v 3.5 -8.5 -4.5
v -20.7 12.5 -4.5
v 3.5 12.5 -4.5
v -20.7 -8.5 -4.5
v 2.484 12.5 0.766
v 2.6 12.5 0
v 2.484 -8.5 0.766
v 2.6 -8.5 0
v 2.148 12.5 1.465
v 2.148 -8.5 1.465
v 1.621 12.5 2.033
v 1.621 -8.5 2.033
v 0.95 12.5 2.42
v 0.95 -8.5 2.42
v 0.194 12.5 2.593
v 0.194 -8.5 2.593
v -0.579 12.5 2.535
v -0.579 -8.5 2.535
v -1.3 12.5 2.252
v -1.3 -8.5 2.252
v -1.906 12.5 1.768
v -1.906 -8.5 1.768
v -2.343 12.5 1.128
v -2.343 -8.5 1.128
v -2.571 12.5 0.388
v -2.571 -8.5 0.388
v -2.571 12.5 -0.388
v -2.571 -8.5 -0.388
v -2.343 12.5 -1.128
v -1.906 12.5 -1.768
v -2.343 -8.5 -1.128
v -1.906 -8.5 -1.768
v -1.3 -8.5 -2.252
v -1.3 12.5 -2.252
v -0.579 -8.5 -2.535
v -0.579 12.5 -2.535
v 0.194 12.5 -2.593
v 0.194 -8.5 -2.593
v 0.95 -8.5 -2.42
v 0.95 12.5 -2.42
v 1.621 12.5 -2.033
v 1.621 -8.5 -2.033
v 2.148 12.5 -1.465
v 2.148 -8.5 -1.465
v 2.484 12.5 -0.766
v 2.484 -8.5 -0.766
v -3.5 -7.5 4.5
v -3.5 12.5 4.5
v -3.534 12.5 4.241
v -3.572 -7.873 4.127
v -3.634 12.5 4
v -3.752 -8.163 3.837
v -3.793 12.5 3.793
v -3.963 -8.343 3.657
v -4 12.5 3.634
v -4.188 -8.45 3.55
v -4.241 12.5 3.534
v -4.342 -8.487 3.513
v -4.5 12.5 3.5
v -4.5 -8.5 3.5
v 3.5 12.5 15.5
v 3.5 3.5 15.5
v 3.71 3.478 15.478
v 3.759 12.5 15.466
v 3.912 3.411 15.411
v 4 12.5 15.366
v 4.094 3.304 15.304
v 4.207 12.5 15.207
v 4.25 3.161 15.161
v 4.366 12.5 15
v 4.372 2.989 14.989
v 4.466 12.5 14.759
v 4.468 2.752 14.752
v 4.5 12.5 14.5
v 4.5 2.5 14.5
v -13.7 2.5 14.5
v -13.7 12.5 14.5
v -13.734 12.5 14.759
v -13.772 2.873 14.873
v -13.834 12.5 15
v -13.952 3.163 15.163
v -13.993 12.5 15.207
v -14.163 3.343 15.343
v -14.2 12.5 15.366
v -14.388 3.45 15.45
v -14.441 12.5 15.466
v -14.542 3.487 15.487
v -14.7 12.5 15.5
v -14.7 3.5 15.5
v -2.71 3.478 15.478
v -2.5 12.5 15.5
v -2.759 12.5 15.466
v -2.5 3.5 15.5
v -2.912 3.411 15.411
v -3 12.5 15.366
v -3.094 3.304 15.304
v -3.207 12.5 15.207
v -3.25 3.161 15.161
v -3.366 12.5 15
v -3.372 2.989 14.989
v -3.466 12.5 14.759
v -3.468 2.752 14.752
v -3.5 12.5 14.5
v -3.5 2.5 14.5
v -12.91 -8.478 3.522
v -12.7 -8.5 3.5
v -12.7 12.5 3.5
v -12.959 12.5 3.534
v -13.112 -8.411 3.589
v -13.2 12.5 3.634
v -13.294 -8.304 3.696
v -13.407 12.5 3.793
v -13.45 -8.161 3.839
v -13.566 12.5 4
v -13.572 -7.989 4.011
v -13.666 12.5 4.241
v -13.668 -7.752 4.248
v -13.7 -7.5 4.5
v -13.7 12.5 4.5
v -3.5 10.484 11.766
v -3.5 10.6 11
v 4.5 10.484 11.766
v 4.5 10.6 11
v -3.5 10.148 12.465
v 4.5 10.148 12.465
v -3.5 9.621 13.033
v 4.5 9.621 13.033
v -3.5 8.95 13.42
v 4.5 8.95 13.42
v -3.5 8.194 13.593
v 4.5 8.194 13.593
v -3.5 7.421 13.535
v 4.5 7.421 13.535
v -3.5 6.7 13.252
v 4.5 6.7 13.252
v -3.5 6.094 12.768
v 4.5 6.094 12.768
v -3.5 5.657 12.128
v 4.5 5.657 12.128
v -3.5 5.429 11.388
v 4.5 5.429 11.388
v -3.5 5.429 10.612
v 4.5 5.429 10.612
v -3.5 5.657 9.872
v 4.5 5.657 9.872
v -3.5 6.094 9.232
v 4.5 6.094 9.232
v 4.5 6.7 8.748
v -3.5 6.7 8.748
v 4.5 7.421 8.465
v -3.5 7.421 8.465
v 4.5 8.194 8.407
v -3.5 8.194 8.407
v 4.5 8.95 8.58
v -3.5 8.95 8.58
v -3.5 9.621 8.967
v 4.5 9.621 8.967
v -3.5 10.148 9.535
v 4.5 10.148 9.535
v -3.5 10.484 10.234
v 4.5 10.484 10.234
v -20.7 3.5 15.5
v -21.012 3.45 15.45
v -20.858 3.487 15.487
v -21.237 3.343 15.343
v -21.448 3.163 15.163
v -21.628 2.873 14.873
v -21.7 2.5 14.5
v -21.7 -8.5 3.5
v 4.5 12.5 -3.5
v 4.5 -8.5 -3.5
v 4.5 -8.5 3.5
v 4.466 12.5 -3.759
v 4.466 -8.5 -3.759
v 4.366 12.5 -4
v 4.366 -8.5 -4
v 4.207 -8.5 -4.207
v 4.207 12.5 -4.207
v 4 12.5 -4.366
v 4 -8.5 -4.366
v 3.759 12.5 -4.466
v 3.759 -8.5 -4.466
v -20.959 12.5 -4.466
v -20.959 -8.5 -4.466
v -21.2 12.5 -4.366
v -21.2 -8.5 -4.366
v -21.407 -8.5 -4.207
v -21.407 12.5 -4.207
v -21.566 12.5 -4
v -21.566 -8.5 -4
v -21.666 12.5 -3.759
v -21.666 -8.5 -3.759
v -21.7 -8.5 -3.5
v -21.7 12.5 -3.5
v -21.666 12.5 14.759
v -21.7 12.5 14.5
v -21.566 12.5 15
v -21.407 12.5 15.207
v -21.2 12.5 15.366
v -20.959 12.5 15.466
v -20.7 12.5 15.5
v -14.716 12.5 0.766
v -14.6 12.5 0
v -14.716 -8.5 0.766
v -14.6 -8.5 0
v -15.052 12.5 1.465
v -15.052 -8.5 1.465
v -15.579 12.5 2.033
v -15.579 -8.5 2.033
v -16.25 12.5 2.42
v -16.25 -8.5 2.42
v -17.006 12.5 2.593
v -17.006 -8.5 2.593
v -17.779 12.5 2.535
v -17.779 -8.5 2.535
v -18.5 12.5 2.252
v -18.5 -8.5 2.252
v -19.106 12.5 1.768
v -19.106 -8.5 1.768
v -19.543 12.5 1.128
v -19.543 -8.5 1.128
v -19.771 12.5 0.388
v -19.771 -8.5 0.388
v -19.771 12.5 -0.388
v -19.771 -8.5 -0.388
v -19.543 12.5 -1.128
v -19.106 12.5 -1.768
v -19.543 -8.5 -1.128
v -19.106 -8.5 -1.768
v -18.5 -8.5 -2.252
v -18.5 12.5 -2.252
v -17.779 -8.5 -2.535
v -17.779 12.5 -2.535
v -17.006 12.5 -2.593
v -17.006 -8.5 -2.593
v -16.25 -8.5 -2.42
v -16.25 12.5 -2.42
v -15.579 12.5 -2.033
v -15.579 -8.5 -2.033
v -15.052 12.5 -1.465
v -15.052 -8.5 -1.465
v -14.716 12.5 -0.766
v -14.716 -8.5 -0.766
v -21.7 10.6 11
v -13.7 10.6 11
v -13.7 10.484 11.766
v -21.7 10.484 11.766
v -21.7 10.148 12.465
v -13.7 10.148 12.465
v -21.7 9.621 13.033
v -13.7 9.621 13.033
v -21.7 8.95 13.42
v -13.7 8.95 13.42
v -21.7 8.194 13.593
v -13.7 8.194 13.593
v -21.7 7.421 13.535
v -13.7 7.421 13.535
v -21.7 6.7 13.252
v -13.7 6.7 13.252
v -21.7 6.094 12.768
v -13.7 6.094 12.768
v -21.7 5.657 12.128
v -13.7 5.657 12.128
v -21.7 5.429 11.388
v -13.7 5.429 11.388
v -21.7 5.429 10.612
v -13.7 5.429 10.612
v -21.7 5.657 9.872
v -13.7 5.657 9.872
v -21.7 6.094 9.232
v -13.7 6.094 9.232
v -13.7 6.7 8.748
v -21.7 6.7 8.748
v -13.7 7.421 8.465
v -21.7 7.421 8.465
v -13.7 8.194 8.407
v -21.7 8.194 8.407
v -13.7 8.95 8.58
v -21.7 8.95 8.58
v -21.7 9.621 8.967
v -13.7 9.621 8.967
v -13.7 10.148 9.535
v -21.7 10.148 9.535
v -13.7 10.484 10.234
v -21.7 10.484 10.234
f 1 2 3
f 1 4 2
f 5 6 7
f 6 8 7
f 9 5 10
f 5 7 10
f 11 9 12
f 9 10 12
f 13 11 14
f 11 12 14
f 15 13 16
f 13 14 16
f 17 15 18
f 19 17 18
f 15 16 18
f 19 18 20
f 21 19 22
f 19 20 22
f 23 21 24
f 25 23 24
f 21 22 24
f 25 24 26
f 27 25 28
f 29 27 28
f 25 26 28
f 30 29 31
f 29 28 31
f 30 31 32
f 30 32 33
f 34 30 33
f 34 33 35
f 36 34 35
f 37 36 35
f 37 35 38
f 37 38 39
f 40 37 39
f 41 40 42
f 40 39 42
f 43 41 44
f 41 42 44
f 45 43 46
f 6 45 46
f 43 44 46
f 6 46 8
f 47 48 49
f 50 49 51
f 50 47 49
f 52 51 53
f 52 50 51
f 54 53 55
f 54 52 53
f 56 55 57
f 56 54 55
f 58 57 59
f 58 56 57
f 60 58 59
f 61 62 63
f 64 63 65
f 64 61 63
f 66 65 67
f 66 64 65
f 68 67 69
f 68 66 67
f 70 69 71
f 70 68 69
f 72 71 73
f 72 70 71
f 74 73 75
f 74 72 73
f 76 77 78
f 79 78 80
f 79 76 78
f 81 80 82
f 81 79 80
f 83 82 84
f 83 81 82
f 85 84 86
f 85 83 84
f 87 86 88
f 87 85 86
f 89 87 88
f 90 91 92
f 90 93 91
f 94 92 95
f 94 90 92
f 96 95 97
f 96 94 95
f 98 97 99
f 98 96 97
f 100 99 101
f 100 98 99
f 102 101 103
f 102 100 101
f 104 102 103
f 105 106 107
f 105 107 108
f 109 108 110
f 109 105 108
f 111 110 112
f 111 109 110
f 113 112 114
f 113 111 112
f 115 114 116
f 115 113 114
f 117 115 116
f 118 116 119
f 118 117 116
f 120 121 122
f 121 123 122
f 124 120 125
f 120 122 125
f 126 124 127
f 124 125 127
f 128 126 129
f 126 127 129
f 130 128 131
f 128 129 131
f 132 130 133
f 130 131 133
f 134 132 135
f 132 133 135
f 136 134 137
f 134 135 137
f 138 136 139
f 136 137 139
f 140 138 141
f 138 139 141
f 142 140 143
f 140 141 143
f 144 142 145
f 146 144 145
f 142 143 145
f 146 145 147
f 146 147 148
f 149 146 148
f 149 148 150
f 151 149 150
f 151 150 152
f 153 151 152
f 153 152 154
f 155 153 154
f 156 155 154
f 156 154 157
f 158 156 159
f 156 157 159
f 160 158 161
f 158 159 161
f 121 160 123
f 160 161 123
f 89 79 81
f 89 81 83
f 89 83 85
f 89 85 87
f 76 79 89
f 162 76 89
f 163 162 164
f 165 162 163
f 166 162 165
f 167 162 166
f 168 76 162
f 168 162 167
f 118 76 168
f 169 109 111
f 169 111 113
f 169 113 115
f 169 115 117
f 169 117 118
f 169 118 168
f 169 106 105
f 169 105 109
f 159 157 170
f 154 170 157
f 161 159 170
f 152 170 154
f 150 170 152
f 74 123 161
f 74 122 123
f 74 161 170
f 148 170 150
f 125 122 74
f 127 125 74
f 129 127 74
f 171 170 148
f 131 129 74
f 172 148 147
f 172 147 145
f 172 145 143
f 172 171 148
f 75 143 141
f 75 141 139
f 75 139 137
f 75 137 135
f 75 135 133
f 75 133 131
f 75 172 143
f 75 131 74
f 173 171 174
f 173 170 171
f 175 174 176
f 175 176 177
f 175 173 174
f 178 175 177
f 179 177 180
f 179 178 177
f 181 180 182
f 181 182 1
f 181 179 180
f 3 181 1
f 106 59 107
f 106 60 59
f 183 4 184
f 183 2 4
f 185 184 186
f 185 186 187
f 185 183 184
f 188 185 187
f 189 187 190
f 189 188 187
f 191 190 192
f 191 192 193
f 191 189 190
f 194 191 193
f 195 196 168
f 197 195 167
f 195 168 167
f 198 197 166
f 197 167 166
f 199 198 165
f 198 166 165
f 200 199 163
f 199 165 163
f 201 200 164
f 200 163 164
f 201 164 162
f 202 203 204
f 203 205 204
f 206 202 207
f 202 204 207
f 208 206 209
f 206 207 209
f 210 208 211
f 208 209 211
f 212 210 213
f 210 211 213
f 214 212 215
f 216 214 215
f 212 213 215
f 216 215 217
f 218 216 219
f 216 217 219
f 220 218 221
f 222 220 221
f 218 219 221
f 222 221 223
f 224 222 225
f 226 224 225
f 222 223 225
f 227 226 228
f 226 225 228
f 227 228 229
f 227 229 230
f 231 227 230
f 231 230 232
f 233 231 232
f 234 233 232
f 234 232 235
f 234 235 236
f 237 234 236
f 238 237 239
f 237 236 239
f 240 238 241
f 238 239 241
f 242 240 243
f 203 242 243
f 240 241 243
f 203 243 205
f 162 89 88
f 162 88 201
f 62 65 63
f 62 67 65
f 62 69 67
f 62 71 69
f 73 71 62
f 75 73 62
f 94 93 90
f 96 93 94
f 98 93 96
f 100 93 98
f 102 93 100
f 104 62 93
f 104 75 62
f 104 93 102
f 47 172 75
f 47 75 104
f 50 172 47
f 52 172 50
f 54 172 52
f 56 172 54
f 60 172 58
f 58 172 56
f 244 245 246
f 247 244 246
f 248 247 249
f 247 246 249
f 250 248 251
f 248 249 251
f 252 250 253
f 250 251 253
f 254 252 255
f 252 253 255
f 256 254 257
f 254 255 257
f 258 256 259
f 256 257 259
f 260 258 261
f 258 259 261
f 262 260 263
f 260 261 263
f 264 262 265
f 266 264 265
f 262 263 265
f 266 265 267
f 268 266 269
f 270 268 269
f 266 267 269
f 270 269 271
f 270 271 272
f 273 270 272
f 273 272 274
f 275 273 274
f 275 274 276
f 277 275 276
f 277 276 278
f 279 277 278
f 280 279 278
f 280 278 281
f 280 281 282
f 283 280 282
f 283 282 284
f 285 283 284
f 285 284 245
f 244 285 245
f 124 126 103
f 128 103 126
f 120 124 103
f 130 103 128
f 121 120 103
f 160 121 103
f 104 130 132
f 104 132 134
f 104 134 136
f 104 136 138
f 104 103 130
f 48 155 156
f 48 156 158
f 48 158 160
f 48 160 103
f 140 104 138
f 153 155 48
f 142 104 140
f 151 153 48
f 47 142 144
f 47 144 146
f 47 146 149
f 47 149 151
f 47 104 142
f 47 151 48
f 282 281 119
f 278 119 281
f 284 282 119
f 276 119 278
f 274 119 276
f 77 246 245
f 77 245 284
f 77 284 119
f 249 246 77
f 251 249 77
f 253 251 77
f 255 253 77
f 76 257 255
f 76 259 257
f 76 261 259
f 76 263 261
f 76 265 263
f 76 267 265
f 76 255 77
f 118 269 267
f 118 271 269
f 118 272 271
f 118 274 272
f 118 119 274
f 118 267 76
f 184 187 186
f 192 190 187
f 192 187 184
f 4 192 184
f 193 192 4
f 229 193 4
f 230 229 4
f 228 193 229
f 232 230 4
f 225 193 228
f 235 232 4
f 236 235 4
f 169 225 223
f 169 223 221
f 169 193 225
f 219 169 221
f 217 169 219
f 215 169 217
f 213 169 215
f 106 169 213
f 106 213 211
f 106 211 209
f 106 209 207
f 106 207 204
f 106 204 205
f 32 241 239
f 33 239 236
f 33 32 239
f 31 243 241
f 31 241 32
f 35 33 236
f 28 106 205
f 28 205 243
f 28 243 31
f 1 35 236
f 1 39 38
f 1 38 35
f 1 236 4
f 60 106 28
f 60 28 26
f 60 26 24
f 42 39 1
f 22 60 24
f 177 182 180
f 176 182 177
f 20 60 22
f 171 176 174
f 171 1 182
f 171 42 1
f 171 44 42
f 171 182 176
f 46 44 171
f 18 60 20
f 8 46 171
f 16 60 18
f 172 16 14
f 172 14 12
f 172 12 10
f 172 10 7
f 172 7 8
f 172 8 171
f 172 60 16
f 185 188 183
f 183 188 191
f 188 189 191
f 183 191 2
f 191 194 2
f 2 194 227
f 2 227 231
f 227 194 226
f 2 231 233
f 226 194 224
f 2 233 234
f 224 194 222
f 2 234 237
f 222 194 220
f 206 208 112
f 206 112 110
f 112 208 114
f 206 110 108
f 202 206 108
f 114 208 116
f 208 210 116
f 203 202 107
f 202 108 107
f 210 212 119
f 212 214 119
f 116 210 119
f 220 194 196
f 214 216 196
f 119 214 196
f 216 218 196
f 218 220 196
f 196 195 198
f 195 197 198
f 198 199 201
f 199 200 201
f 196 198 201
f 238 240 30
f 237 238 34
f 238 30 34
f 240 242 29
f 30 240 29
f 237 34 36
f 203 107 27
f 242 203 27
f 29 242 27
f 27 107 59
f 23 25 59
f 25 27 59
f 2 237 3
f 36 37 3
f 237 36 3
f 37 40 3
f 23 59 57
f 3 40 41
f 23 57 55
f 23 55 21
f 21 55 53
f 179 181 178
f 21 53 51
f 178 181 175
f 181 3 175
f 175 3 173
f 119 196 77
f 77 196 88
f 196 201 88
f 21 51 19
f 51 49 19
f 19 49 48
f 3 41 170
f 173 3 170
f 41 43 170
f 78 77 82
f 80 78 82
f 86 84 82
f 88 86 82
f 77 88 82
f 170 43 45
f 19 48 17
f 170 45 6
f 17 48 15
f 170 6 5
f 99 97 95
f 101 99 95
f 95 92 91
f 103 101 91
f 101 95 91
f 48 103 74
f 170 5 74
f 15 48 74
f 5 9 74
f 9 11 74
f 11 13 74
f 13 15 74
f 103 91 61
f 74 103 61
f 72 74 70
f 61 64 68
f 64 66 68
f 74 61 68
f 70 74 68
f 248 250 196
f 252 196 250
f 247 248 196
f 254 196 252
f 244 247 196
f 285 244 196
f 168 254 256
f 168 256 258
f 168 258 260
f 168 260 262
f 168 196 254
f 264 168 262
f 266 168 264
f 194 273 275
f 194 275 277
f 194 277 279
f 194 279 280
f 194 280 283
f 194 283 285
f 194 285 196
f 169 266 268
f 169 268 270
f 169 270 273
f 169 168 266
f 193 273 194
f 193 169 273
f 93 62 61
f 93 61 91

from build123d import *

# Parameters (mm, degrees)
F1_DEPTH      = 8.5
F1_DEPTH_BACK = 12.5
F2_R          = 2.6
F3_DEPTH      = 13
F3_DEPTH_BACK = 13
F4_R          = 2.6
F5_DEPTH      = 25
F5_DEPTH_BACK = 25
F6_SIZE       = 12
F7_R          = 1


with BuildPart() as f1:
    # F0 (on Front) → F1 (new body, two sides)
    with BuildSketch(Plane.XZ) as f1_sk:
        Polygon((4.5, 15.5), (-3.5, 15.5), (-3.5, 3.5), (-13.7, 3.5), (-13.7, 15.5), (-21.7, 15.5), (-21.7, -4.5), (4.5, -4.5), align=None)
    extrude(amount=F1_DEPTH)
    extrude(f1_sk.sketch, amount=-F1_DEPTH_BACK)

    # F2 (on Front) → F3 (cut, two sides)
    with BuildSketch(Plane.XZ) as f3_sk:
        Circle(F2_R)
        with Locations((-17.2, 0)):
            Circle(F2_R)
    extrude(amount=F3_DEPTH, mode=Mode.SUBTRACT)
    extrude(f3_sk.sketch, amount=-F3_DEPTH_BACK, mode=Mode.SUBTRACT)

    # F4 (on Right) → F5 (cut, two sides)
    with BuildSketch(Plane.YZ) as f5_sk:
        with Locations((8, 11)):
            Circle(F4_R)
    extrude(amount=-F5_DEPTH, mode=Mode.SUBTRACT)
    extrude(f5_sk.sketch, amount=F5_DEPTH_BACK, mode=Mode.SUBTRACT)

    # F6
    f6_edges = [f1.edges().sort_by_distance(p)[0] for p in [
        (-17.7, -8.5, 15.5),
        (0.5, -8.5, 15.5),
    ]]
    chamfer(f6_edges, length=F6_SIZE)

    # F7
    f7_edges = [f1.edges().sort_by_distance(p)[0] for p in [
        (4.5, 2, -4.5),
        (4.5, 8, 15.5),
        (-21.7, 2, -4.5),
        (-21.7, 8, 15.5),
        (-13.7, 8, 15.5),
        (-3.5, 2, 3.5),
        (-13.7, 2, 3.5),
        (-3.5, 8, 15.5),
    ]]
    fillet(f7_edges, radius=F7_R)


solid = f1.part
